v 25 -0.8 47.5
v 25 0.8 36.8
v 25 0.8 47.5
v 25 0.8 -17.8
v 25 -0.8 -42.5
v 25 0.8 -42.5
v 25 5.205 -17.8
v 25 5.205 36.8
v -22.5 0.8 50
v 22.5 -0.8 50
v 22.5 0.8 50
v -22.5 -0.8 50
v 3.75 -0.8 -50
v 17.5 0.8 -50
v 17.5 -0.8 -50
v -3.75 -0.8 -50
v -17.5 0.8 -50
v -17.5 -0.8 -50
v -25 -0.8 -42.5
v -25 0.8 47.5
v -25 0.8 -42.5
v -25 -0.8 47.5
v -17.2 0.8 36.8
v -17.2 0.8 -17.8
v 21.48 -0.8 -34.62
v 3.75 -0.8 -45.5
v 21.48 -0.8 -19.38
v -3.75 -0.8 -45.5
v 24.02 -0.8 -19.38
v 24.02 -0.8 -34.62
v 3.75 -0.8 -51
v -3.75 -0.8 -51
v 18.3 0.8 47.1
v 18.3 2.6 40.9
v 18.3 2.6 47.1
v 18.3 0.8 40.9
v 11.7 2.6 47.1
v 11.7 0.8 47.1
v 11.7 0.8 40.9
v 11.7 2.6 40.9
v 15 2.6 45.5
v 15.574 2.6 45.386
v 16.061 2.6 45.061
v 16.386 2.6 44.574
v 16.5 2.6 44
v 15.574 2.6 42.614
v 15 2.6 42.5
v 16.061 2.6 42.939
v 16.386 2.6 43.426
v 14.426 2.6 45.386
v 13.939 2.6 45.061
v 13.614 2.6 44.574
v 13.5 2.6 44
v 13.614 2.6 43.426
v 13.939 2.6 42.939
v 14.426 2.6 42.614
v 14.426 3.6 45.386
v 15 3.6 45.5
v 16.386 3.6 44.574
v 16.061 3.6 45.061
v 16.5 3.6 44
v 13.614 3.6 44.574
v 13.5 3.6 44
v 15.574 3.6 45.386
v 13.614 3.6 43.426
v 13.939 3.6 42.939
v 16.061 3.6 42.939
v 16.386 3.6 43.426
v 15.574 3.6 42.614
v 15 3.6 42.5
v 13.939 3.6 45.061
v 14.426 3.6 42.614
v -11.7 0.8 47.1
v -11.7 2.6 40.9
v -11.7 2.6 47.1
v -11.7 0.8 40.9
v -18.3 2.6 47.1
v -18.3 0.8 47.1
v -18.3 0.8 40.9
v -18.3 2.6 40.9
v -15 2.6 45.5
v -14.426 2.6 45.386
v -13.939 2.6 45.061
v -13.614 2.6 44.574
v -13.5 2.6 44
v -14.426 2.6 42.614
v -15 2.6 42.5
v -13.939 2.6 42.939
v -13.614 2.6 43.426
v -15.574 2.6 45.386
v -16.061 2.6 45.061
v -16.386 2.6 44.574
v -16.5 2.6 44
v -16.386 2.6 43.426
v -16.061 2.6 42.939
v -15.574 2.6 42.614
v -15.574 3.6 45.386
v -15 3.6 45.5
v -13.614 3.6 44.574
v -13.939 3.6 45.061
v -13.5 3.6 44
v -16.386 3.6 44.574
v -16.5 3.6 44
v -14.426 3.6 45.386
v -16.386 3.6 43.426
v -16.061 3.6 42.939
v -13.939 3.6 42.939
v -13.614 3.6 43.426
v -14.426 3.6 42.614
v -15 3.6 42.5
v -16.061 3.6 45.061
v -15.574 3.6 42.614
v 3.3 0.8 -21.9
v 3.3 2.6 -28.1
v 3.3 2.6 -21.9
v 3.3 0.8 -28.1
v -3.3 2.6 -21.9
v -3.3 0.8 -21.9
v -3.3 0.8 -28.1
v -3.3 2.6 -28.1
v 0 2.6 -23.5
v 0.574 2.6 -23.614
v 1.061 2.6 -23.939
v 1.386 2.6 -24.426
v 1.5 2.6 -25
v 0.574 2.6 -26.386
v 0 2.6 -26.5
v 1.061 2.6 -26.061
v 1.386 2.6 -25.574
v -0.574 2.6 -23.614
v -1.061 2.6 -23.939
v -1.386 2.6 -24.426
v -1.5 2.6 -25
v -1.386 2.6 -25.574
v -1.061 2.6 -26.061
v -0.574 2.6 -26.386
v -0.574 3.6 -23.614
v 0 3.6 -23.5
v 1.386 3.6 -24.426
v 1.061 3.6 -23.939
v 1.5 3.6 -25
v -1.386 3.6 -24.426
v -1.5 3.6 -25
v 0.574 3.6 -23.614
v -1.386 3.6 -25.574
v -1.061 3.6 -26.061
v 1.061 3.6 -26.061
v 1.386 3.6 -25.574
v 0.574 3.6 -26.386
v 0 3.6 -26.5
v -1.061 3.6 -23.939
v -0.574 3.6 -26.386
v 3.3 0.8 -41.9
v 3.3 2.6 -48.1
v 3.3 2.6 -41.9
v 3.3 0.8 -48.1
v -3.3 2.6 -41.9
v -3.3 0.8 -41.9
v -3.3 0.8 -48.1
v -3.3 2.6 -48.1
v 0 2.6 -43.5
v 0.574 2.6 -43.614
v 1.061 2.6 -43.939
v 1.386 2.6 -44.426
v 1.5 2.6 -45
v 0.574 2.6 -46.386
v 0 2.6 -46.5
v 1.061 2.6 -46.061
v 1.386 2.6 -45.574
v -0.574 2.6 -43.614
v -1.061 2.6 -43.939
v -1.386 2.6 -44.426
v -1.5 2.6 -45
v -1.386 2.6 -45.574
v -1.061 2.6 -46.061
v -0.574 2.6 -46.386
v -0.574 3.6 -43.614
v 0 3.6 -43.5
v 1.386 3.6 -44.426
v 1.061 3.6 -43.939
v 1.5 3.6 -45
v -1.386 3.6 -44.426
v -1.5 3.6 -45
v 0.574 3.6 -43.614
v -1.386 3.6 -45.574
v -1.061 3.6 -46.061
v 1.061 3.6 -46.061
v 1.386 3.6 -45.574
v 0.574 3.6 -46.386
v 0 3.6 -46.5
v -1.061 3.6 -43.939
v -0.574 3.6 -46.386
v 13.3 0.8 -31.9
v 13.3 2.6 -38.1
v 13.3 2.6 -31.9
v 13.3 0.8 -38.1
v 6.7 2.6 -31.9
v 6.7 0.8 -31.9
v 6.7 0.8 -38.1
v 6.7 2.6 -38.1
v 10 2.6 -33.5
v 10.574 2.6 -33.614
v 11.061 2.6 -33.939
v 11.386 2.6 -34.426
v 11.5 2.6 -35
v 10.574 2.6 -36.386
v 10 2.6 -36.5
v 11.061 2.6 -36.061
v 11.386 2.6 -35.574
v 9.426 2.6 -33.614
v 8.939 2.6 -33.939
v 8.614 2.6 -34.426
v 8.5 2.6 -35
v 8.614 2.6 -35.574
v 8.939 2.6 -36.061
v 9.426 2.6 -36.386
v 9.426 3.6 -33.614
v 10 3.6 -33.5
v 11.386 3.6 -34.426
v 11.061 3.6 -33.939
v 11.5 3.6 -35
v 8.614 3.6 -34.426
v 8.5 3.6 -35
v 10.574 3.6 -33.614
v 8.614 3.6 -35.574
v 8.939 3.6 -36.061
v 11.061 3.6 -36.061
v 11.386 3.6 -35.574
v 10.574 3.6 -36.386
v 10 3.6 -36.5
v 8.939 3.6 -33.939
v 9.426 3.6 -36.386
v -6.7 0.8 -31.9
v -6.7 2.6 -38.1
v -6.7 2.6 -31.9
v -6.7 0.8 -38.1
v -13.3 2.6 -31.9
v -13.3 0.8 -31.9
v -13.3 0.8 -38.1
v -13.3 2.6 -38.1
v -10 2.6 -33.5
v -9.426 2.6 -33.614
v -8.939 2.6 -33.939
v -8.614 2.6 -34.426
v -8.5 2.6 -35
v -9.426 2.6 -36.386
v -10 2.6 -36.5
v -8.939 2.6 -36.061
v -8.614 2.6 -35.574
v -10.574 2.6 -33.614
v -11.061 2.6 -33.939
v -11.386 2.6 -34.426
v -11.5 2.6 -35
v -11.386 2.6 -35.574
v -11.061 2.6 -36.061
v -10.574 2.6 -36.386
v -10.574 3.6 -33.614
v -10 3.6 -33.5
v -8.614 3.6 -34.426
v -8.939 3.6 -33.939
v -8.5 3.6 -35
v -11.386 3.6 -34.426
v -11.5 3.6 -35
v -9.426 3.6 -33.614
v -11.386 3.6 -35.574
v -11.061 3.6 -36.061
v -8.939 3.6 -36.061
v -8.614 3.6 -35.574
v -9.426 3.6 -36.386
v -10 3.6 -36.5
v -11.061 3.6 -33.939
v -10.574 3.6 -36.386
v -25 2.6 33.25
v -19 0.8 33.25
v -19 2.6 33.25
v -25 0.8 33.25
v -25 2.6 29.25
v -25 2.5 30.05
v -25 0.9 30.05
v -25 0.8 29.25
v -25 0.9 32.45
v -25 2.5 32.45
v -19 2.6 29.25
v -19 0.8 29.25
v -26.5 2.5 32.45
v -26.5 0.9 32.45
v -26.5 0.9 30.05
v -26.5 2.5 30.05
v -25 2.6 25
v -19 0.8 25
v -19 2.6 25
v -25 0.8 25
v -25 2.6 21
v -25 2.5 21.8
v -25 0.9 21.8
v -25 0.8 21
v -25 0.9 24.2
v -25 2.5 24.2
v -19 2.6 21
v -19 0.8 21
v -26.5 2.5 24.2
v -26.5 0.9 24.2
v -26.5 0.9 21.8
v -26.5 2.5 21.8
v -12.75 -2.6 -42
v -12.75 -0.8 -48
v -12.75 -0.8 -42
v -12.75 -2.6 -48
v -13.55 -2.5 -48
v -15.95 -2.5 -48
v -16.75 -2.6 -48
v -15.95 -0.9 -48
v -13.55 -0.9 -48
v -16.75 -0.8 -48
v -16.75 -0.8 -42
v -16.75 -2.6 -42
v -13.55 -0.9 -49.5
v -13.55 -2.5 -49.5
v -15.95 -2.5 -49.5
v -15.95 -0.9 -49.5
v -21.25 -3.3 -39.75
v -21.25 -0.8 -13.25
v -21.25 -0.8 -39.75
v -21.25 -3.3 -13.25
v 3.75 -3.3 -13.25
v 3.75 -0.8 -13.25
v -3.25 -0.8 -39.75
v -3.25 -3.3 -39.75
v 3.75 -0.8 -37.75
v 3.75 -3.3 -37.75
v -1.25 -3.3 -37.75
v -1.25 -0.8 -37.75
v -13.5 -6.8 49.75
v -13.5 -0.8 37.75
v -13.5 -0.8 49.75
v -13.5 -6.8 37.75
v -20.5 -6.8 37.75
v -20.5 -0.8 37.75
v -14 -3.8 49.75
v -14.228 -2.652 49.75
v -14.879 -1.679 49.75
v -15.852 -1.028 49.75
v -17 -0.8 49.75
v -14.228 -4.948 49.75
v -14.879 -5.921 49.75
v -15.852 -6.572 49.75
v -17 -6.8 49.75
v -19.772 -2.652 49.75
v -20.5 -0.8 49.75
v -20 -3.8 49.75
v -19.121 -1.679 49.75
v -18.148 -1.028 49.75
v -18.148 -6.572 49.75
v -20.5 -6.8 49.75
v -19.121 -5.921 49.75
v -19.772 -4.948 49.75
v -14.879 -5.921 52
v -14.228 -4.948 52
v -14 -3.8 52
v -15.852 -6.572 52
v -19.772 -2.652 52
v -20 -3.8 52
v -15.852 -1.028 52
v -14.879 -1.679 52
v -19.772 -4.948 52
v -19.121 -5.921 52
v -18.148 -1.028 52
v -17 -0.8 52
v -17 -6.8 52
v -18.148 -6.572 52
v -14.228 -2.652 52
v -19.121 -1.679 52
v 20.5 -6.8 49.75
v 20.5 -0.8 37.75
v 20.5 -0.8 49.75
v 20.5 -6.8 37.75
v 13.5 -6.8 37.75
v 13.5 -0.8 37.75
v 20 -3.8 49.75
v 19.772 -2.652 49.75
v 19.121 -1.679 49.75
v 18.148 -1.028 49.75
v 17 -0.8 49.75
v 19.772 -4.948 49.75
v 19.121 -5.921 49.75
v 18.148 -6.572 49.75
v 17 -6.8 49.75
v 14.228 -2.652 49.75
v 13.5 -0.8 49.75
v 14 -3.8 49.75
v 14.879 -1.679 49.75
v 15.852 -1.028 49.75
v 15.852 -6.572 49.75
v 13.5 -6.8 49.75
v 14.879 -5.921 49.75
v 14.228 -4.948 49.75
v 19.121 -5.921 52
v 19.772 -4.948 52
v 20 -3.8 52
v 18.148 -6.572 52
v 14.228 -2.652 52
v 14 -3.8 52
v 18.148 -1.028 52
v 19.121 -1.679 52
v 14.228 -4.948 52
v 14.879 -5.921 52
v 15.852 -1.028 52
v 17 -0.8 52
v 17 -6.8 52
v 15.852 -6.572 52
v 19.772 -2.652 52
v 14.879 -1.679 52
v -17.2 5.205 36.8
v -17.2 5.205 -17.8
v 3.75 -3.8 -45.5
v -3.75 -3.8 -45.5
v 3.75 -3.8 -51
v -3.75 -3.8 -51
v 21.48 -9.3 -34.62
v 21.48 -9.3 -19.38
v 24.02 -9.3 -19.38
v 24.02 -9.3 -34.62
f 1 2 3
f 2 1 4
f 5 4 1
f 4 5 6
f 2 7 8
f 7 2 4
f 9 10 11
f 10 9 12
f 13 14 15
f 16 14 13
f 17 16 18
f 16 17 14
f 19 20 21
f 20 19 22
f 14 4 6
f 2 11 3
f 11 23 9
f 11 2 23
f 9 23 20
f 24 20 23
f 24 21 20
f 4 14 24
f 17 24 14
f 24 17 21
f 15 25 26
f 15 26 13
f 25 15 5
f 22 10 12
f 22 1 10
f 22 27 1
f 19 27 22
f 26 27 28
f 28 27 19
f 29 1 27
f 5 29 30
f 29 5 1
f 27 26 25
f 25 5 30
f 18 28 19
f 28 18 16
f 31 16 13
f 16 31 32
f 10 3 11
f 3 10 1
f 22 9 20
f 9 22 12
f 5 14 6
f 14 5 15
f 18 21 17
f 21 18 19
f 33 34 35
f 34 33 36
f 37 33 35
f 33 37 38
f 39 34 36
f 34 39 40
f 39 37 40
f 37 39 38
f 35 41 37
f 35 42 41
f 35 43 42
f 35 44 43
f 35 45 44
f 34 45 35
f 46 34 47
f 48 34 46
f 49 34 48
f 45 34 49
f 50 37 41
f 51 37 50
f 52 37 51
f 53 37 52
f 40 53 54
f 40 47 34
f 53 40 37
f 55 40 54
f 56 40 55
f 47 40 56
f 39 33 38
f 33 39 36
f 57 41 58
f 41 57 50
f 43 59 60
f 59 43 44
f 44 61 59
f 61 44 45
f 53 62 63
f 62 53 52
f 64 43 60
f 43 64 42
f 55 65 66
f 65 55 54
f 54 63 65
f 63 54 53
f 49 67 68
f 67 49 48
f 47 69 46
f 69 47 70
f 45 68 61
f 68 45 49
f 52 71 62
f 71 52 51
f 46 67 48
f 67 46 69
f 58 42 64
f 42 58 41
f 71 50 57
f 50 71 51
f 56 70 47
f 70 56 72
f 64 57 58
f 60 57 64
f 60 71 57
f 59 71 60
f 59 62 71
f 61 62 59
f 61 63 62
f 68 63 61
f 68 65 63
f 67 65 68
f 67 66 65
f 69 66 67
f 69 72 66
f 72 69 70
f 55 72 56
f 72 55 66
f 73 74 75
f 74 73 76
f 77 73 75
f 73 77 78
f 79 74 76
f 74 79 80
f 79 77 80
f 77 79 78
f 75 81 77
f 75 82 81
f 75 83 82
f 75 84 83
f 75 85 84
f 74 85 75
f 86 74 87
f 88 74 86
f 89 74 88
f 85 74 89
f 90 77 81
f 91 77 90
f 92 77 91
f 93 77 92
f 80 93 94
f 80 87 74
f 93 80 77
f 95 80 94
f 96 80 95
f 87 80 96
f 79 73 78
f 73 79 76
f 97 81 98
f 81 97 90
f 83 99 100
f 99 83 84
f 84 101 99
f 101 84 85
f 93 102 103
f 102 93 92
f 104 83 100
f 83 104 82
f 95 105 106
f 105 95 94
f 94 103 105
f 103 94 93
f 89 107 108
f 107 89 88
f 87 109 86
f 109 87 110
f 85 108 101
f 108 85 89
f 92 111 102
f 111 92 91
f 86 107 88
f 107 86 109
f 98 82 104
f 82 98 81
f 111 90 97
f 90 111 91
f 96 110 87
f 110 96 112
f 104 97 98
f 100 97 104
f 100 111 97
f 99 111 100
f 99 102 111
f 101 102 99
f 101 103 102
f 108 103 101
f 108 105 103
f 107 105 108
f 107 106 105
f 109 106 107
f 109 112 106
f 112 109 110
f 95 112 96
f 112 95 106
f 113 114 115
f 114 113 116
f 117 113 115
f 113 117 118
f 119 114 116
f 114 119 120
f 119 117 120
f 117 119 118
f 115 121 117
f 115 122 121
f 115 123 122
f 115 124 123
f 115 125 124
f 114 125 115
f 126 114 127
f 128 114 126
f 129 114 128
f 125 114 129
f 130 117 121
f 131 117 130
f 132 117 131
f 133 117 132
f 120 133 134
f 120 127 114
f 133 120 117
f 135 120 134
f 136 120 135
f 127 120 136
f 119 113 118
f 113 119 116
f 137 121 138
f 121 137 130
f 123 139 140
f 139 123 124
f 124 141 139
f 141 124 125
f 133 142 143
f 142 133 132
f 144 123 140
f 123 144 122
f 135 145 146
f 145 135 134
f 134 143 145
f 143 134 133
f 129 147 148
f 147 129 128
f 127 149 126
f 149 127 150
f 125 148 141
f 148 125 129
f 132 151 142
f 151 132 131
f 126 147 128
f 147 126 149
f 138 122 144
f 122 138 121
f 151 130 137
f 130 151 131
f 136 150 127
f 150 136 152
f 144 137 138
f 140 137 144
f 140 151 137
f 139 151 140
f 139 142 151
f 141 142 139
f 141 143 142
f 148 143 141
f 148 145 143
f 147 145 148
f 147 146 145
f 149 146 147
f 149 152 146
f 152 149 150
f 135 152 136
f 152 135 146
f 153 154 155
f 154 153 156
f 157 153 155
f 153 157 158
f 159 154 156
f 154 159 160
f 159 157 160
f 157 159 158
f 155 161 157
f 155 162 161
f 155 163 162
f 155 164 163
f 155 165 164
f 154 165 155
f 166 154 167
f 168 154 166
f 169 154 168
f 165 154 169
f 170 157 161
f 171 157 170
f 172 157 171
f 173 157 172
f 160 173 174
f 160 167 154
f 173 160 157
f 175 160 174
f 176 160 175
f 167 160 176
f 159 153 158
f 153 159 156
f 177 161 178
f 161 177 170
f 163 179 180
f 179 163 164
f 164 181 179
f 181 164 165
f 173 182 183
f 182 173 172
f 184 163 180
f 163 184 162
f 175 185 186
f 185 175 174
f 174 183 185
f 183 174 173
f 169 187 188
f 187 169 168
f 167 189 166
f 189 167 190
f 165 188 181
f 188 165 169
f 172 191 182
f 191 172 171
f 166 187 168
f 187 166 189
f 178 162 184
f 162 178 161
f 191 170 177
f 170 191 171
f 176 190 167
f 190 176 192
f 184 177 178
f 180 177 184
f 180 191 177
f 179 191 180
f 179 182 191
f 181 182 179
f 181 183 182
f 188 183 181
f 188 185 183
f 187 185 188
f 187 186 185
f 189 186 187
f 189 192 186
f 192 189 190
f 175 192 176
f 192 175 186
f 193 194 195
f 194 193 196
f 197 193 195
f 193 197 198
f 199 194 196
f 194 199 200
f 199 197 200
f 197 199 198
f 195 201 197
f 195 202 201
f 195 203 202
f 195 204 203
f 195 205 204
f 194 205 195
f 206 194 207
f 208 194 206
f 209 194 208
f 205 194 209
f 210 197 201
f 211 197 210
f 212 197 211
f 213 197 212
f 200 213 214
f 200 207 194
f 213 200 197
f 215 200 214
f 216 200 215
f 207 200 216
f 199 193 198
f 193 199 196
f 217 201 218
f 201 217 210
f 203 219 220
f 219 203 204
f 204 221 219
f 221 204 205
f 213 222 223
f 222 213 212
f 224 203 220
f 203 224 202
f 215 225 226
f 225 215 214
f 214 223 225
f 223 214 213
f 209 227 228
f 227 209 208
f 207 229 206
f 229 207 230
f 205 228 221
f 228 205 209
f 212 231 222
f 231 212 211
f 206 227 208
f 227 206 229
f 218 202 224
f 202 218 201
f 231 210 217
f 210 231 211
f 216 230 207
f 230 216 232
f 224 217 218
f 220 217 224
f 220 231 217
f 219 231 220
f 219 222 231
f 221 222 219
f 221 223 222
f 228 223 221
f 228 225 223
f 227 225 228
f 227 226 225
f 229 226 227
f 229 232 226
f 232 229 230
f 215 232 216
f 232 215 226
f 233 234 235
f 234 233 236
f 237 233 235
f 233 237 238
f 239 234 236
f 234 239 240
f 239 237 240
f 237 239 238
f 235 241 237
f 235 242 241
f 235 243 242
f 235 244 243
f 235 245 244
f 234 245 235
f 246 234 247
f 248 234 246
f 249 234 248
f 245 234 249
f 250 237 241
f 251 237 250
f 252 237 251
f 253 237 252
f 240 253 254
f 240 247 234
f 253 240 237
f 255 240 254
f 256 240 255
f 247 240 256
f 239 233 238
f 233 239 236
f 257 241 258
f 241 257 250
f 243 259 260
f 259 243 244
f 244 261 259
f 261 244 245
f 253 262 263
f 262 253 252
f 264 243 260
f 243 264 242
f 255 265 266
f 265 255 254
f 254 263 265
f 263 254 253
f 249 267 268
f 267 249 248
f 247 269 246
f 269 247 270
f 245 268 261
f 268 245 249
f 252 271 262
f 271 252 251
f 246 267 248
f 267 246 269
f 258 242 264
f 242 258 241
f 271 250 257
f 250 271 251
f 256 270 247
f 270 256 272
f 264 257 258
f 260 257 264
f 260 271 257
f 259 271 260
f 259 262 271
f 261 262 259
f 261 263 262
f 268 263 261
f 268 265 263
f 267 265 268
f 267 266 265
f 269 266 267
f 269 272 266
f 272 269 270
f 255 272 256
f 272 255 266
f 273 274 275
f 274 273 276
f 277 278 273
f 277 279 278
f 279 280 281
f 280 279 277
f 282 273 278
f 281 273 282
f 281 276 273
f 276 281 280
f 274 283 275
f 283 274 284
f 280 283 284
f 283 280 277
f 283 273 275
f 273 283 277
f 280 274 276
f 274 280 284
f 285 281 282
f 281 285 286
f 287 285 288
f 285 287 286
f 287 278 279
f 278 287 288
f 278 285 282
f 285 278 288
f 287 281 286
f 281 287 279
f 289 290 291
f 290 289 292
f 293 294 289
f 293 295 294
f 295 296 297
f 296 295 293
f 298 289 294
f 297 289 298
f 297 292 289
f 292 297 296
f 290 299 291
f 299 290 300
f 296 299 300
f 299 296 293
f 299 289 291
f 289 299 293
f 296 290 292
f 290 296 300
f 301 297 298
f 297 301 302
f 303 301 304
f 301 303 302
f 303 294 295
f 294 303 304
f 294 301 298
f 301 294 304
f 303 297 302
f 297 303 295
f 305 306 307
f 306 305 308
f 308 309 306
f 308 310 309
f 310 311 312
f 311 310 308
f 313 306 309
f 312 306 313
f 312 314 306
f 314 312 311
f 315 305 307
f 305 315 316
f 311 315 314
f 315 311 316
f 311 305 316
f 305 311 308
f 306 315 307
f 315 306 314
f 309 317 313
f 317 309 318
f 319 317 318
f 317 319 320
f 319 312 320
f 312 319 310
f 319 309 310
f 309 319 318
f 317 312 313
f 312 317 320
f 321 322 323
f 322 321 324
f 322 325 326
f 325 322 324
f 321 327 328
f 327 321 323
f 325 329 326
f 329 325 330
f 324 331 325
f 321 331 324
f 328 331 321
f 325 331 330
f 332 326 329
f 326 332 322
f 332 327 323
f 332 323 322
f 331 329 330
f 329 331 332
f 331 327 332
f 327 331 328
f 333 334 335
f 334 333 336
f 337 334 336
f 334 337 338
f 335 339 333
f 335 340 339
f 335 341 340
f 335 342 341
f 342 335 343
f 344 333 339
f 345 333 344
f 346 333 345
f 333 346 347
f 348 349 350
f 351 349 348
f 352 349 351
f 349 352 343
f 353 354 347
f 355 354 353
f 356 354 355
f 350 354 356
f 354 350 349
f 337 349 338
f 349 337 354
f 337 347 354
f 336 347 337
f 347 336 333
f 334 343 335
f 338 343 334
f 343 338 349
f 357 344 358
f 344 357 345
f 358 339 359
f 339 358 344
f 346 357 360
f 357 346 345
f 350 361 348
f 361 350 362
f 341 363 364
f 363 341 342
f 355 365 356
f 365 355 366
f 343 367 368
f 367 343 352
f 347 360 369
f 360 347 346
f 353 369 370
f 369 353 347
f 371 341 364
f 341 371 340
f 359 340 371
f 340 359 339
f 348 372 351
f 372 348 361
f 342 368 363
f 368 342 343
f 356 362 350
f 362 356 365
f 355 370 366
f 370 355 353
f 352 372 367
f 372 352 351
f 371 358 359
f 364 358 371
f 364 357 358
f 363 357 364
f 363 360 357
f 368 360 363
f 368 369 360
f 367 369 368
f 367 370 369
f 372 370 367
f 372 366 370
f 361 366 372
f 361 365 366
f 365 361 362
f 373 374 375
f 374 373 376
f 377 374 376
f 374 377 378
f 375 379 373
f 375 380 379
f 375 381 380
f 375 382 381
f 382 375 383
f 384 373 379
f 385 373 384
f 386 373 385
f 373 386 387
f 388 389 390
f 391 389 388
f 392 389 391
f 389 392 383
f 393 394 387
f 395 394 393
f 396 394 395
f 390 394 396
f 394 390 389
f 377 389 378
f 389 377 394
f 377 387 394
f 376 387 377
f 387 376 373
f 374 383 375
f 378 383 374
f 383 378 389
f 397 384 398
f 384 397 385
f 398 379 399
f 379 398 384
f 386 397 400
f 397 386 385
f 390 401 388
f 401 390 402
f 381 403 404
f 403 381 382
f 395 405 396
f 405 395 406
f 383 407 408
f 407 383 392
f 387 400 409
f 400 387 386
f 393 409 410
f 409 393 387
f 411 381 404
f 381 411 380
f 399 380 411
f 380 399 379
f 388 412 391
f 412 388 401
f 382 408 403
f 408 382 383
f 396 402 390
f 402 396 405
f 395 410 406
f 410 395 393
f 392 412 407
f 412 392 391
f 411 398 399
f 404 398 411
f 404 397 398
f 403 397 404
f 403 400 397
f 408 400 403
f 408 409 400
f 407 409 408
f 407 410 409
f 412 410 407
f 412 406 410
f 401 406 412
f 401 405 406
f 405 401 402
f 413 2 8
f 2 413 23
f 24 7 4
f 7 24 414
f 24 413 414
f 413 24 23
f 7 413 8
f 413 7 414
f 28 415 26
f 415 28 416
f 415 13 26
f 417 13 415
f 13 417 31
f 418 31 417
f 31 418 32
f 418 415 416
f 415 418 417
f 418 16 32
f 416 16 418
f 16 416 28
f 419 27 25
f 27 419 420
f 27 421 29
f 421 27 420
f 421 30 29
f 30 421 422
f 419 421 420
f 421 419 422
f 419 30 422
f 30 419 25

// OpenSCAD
module switch() {
	union() {
		translate([0,0.9,0]) cube([6.6,1.8,6.2],center=true);
		translate([0,2.3,0]) rotate([90,0,0]) cylinder(r1=1.5, r2=1.5, h=1, $fn=16, center=true);
	}
}

module side_switch() {
	union() {
		translate([0,0.9,0]) cube([4,1.8,6],center=true);
		translate([0,0.9,3.75]) cube([2.4,1.6,1.5],center=true);
	}
}

module sdcard_holder() {
	difference() {
		translate([0,0,-13.25]) cube([25,2.5,26.5]);
		translate([-0.1,-0.1,-13.35]) cube([5.1,3,2.1]);
		translate([5,1.25,-13.25]) rotate([0,45,0]) cube([2.828,3,2.828],center=true);
	}
}

module jack_socket() {
	union() {
		translate([-3.5,0,2.5]) cube([7,6,12]);
		translate([0,3,1.5]) rotate() cylinder(r1=3, r2=3, h=2.5, $fn=16, center=true);
	}
}

module usb_socket() {
	translate([-3.75,0,0]) cube([7.5,3,5.5]);
}

module programming_header() {
	translate([-7.62,0,-1.27]) cube([15.24,8.5,2.54]);
}

module pcba() {
	union() {
		// PCB
		difference() {
			cube([50.0,1.6,100.0], center = true);
			translate([25,0,50]) rotate([0,45,0]) cube([3.5355,3.5355,3.5355], center=true);
			translate([-25,0,50]) rotate([0,45,0]) cube([3.5355,3.5355,3.5355], center=true);
			translate([25,0,-50]) rotate([0,45,0]) cube([10.6066,10.6066,10.6066], center=true);
			translate([-25,0,-50]) rotate([0,45,0]) cube([10.6066,10.6066,10.6066], center=true);
		}
		// screen
		translate([25-42.2,0.8,9.5-27.3]) cube([42.2,4.405,54.6]);
		// buttons
		translate([15,0.8,44]) switch();
		translate([-15,0.8,44]) switch();
		translate([0,0.8,-25]) switch();
		translate([0,0.8,-45]) switch();
		translate([10,0.8,-35]) switch();
		translate([-10,0.8,-35]) switch();

		// volume switches
		translate([-22,0.8,31.25]) rotate([0,270,0]) side_switch();
		translate([-22,0.8,23]) rotate([0,270,0]) side_switch();
		// reset switch
		translate([-14.75,-0.8,-45]) rotate([0,180,180]) side_switch();

		// hold switch

		// sd card holder
		translate([3.75,-0.8,-26.5]) rotate([180,180,0]) sdcard_holder();

		// jack sockets
		translate([-17,-0.8,52.25]) rotate([0,180,180]) jack_socket();
		translate([17,-0.8,52.25]) rotate([0,180,180]) jack_socket();

		// USB socket
		translate([0,-0.8,-51]) rotate([180,180,0]) usb_socket();

		// programming header
		translate([22.75,-0.8,-27]) rotate([180,90,0]) programming_header();

		// Cortex-debug connector

		// battery connector

	}
}

pcba();
